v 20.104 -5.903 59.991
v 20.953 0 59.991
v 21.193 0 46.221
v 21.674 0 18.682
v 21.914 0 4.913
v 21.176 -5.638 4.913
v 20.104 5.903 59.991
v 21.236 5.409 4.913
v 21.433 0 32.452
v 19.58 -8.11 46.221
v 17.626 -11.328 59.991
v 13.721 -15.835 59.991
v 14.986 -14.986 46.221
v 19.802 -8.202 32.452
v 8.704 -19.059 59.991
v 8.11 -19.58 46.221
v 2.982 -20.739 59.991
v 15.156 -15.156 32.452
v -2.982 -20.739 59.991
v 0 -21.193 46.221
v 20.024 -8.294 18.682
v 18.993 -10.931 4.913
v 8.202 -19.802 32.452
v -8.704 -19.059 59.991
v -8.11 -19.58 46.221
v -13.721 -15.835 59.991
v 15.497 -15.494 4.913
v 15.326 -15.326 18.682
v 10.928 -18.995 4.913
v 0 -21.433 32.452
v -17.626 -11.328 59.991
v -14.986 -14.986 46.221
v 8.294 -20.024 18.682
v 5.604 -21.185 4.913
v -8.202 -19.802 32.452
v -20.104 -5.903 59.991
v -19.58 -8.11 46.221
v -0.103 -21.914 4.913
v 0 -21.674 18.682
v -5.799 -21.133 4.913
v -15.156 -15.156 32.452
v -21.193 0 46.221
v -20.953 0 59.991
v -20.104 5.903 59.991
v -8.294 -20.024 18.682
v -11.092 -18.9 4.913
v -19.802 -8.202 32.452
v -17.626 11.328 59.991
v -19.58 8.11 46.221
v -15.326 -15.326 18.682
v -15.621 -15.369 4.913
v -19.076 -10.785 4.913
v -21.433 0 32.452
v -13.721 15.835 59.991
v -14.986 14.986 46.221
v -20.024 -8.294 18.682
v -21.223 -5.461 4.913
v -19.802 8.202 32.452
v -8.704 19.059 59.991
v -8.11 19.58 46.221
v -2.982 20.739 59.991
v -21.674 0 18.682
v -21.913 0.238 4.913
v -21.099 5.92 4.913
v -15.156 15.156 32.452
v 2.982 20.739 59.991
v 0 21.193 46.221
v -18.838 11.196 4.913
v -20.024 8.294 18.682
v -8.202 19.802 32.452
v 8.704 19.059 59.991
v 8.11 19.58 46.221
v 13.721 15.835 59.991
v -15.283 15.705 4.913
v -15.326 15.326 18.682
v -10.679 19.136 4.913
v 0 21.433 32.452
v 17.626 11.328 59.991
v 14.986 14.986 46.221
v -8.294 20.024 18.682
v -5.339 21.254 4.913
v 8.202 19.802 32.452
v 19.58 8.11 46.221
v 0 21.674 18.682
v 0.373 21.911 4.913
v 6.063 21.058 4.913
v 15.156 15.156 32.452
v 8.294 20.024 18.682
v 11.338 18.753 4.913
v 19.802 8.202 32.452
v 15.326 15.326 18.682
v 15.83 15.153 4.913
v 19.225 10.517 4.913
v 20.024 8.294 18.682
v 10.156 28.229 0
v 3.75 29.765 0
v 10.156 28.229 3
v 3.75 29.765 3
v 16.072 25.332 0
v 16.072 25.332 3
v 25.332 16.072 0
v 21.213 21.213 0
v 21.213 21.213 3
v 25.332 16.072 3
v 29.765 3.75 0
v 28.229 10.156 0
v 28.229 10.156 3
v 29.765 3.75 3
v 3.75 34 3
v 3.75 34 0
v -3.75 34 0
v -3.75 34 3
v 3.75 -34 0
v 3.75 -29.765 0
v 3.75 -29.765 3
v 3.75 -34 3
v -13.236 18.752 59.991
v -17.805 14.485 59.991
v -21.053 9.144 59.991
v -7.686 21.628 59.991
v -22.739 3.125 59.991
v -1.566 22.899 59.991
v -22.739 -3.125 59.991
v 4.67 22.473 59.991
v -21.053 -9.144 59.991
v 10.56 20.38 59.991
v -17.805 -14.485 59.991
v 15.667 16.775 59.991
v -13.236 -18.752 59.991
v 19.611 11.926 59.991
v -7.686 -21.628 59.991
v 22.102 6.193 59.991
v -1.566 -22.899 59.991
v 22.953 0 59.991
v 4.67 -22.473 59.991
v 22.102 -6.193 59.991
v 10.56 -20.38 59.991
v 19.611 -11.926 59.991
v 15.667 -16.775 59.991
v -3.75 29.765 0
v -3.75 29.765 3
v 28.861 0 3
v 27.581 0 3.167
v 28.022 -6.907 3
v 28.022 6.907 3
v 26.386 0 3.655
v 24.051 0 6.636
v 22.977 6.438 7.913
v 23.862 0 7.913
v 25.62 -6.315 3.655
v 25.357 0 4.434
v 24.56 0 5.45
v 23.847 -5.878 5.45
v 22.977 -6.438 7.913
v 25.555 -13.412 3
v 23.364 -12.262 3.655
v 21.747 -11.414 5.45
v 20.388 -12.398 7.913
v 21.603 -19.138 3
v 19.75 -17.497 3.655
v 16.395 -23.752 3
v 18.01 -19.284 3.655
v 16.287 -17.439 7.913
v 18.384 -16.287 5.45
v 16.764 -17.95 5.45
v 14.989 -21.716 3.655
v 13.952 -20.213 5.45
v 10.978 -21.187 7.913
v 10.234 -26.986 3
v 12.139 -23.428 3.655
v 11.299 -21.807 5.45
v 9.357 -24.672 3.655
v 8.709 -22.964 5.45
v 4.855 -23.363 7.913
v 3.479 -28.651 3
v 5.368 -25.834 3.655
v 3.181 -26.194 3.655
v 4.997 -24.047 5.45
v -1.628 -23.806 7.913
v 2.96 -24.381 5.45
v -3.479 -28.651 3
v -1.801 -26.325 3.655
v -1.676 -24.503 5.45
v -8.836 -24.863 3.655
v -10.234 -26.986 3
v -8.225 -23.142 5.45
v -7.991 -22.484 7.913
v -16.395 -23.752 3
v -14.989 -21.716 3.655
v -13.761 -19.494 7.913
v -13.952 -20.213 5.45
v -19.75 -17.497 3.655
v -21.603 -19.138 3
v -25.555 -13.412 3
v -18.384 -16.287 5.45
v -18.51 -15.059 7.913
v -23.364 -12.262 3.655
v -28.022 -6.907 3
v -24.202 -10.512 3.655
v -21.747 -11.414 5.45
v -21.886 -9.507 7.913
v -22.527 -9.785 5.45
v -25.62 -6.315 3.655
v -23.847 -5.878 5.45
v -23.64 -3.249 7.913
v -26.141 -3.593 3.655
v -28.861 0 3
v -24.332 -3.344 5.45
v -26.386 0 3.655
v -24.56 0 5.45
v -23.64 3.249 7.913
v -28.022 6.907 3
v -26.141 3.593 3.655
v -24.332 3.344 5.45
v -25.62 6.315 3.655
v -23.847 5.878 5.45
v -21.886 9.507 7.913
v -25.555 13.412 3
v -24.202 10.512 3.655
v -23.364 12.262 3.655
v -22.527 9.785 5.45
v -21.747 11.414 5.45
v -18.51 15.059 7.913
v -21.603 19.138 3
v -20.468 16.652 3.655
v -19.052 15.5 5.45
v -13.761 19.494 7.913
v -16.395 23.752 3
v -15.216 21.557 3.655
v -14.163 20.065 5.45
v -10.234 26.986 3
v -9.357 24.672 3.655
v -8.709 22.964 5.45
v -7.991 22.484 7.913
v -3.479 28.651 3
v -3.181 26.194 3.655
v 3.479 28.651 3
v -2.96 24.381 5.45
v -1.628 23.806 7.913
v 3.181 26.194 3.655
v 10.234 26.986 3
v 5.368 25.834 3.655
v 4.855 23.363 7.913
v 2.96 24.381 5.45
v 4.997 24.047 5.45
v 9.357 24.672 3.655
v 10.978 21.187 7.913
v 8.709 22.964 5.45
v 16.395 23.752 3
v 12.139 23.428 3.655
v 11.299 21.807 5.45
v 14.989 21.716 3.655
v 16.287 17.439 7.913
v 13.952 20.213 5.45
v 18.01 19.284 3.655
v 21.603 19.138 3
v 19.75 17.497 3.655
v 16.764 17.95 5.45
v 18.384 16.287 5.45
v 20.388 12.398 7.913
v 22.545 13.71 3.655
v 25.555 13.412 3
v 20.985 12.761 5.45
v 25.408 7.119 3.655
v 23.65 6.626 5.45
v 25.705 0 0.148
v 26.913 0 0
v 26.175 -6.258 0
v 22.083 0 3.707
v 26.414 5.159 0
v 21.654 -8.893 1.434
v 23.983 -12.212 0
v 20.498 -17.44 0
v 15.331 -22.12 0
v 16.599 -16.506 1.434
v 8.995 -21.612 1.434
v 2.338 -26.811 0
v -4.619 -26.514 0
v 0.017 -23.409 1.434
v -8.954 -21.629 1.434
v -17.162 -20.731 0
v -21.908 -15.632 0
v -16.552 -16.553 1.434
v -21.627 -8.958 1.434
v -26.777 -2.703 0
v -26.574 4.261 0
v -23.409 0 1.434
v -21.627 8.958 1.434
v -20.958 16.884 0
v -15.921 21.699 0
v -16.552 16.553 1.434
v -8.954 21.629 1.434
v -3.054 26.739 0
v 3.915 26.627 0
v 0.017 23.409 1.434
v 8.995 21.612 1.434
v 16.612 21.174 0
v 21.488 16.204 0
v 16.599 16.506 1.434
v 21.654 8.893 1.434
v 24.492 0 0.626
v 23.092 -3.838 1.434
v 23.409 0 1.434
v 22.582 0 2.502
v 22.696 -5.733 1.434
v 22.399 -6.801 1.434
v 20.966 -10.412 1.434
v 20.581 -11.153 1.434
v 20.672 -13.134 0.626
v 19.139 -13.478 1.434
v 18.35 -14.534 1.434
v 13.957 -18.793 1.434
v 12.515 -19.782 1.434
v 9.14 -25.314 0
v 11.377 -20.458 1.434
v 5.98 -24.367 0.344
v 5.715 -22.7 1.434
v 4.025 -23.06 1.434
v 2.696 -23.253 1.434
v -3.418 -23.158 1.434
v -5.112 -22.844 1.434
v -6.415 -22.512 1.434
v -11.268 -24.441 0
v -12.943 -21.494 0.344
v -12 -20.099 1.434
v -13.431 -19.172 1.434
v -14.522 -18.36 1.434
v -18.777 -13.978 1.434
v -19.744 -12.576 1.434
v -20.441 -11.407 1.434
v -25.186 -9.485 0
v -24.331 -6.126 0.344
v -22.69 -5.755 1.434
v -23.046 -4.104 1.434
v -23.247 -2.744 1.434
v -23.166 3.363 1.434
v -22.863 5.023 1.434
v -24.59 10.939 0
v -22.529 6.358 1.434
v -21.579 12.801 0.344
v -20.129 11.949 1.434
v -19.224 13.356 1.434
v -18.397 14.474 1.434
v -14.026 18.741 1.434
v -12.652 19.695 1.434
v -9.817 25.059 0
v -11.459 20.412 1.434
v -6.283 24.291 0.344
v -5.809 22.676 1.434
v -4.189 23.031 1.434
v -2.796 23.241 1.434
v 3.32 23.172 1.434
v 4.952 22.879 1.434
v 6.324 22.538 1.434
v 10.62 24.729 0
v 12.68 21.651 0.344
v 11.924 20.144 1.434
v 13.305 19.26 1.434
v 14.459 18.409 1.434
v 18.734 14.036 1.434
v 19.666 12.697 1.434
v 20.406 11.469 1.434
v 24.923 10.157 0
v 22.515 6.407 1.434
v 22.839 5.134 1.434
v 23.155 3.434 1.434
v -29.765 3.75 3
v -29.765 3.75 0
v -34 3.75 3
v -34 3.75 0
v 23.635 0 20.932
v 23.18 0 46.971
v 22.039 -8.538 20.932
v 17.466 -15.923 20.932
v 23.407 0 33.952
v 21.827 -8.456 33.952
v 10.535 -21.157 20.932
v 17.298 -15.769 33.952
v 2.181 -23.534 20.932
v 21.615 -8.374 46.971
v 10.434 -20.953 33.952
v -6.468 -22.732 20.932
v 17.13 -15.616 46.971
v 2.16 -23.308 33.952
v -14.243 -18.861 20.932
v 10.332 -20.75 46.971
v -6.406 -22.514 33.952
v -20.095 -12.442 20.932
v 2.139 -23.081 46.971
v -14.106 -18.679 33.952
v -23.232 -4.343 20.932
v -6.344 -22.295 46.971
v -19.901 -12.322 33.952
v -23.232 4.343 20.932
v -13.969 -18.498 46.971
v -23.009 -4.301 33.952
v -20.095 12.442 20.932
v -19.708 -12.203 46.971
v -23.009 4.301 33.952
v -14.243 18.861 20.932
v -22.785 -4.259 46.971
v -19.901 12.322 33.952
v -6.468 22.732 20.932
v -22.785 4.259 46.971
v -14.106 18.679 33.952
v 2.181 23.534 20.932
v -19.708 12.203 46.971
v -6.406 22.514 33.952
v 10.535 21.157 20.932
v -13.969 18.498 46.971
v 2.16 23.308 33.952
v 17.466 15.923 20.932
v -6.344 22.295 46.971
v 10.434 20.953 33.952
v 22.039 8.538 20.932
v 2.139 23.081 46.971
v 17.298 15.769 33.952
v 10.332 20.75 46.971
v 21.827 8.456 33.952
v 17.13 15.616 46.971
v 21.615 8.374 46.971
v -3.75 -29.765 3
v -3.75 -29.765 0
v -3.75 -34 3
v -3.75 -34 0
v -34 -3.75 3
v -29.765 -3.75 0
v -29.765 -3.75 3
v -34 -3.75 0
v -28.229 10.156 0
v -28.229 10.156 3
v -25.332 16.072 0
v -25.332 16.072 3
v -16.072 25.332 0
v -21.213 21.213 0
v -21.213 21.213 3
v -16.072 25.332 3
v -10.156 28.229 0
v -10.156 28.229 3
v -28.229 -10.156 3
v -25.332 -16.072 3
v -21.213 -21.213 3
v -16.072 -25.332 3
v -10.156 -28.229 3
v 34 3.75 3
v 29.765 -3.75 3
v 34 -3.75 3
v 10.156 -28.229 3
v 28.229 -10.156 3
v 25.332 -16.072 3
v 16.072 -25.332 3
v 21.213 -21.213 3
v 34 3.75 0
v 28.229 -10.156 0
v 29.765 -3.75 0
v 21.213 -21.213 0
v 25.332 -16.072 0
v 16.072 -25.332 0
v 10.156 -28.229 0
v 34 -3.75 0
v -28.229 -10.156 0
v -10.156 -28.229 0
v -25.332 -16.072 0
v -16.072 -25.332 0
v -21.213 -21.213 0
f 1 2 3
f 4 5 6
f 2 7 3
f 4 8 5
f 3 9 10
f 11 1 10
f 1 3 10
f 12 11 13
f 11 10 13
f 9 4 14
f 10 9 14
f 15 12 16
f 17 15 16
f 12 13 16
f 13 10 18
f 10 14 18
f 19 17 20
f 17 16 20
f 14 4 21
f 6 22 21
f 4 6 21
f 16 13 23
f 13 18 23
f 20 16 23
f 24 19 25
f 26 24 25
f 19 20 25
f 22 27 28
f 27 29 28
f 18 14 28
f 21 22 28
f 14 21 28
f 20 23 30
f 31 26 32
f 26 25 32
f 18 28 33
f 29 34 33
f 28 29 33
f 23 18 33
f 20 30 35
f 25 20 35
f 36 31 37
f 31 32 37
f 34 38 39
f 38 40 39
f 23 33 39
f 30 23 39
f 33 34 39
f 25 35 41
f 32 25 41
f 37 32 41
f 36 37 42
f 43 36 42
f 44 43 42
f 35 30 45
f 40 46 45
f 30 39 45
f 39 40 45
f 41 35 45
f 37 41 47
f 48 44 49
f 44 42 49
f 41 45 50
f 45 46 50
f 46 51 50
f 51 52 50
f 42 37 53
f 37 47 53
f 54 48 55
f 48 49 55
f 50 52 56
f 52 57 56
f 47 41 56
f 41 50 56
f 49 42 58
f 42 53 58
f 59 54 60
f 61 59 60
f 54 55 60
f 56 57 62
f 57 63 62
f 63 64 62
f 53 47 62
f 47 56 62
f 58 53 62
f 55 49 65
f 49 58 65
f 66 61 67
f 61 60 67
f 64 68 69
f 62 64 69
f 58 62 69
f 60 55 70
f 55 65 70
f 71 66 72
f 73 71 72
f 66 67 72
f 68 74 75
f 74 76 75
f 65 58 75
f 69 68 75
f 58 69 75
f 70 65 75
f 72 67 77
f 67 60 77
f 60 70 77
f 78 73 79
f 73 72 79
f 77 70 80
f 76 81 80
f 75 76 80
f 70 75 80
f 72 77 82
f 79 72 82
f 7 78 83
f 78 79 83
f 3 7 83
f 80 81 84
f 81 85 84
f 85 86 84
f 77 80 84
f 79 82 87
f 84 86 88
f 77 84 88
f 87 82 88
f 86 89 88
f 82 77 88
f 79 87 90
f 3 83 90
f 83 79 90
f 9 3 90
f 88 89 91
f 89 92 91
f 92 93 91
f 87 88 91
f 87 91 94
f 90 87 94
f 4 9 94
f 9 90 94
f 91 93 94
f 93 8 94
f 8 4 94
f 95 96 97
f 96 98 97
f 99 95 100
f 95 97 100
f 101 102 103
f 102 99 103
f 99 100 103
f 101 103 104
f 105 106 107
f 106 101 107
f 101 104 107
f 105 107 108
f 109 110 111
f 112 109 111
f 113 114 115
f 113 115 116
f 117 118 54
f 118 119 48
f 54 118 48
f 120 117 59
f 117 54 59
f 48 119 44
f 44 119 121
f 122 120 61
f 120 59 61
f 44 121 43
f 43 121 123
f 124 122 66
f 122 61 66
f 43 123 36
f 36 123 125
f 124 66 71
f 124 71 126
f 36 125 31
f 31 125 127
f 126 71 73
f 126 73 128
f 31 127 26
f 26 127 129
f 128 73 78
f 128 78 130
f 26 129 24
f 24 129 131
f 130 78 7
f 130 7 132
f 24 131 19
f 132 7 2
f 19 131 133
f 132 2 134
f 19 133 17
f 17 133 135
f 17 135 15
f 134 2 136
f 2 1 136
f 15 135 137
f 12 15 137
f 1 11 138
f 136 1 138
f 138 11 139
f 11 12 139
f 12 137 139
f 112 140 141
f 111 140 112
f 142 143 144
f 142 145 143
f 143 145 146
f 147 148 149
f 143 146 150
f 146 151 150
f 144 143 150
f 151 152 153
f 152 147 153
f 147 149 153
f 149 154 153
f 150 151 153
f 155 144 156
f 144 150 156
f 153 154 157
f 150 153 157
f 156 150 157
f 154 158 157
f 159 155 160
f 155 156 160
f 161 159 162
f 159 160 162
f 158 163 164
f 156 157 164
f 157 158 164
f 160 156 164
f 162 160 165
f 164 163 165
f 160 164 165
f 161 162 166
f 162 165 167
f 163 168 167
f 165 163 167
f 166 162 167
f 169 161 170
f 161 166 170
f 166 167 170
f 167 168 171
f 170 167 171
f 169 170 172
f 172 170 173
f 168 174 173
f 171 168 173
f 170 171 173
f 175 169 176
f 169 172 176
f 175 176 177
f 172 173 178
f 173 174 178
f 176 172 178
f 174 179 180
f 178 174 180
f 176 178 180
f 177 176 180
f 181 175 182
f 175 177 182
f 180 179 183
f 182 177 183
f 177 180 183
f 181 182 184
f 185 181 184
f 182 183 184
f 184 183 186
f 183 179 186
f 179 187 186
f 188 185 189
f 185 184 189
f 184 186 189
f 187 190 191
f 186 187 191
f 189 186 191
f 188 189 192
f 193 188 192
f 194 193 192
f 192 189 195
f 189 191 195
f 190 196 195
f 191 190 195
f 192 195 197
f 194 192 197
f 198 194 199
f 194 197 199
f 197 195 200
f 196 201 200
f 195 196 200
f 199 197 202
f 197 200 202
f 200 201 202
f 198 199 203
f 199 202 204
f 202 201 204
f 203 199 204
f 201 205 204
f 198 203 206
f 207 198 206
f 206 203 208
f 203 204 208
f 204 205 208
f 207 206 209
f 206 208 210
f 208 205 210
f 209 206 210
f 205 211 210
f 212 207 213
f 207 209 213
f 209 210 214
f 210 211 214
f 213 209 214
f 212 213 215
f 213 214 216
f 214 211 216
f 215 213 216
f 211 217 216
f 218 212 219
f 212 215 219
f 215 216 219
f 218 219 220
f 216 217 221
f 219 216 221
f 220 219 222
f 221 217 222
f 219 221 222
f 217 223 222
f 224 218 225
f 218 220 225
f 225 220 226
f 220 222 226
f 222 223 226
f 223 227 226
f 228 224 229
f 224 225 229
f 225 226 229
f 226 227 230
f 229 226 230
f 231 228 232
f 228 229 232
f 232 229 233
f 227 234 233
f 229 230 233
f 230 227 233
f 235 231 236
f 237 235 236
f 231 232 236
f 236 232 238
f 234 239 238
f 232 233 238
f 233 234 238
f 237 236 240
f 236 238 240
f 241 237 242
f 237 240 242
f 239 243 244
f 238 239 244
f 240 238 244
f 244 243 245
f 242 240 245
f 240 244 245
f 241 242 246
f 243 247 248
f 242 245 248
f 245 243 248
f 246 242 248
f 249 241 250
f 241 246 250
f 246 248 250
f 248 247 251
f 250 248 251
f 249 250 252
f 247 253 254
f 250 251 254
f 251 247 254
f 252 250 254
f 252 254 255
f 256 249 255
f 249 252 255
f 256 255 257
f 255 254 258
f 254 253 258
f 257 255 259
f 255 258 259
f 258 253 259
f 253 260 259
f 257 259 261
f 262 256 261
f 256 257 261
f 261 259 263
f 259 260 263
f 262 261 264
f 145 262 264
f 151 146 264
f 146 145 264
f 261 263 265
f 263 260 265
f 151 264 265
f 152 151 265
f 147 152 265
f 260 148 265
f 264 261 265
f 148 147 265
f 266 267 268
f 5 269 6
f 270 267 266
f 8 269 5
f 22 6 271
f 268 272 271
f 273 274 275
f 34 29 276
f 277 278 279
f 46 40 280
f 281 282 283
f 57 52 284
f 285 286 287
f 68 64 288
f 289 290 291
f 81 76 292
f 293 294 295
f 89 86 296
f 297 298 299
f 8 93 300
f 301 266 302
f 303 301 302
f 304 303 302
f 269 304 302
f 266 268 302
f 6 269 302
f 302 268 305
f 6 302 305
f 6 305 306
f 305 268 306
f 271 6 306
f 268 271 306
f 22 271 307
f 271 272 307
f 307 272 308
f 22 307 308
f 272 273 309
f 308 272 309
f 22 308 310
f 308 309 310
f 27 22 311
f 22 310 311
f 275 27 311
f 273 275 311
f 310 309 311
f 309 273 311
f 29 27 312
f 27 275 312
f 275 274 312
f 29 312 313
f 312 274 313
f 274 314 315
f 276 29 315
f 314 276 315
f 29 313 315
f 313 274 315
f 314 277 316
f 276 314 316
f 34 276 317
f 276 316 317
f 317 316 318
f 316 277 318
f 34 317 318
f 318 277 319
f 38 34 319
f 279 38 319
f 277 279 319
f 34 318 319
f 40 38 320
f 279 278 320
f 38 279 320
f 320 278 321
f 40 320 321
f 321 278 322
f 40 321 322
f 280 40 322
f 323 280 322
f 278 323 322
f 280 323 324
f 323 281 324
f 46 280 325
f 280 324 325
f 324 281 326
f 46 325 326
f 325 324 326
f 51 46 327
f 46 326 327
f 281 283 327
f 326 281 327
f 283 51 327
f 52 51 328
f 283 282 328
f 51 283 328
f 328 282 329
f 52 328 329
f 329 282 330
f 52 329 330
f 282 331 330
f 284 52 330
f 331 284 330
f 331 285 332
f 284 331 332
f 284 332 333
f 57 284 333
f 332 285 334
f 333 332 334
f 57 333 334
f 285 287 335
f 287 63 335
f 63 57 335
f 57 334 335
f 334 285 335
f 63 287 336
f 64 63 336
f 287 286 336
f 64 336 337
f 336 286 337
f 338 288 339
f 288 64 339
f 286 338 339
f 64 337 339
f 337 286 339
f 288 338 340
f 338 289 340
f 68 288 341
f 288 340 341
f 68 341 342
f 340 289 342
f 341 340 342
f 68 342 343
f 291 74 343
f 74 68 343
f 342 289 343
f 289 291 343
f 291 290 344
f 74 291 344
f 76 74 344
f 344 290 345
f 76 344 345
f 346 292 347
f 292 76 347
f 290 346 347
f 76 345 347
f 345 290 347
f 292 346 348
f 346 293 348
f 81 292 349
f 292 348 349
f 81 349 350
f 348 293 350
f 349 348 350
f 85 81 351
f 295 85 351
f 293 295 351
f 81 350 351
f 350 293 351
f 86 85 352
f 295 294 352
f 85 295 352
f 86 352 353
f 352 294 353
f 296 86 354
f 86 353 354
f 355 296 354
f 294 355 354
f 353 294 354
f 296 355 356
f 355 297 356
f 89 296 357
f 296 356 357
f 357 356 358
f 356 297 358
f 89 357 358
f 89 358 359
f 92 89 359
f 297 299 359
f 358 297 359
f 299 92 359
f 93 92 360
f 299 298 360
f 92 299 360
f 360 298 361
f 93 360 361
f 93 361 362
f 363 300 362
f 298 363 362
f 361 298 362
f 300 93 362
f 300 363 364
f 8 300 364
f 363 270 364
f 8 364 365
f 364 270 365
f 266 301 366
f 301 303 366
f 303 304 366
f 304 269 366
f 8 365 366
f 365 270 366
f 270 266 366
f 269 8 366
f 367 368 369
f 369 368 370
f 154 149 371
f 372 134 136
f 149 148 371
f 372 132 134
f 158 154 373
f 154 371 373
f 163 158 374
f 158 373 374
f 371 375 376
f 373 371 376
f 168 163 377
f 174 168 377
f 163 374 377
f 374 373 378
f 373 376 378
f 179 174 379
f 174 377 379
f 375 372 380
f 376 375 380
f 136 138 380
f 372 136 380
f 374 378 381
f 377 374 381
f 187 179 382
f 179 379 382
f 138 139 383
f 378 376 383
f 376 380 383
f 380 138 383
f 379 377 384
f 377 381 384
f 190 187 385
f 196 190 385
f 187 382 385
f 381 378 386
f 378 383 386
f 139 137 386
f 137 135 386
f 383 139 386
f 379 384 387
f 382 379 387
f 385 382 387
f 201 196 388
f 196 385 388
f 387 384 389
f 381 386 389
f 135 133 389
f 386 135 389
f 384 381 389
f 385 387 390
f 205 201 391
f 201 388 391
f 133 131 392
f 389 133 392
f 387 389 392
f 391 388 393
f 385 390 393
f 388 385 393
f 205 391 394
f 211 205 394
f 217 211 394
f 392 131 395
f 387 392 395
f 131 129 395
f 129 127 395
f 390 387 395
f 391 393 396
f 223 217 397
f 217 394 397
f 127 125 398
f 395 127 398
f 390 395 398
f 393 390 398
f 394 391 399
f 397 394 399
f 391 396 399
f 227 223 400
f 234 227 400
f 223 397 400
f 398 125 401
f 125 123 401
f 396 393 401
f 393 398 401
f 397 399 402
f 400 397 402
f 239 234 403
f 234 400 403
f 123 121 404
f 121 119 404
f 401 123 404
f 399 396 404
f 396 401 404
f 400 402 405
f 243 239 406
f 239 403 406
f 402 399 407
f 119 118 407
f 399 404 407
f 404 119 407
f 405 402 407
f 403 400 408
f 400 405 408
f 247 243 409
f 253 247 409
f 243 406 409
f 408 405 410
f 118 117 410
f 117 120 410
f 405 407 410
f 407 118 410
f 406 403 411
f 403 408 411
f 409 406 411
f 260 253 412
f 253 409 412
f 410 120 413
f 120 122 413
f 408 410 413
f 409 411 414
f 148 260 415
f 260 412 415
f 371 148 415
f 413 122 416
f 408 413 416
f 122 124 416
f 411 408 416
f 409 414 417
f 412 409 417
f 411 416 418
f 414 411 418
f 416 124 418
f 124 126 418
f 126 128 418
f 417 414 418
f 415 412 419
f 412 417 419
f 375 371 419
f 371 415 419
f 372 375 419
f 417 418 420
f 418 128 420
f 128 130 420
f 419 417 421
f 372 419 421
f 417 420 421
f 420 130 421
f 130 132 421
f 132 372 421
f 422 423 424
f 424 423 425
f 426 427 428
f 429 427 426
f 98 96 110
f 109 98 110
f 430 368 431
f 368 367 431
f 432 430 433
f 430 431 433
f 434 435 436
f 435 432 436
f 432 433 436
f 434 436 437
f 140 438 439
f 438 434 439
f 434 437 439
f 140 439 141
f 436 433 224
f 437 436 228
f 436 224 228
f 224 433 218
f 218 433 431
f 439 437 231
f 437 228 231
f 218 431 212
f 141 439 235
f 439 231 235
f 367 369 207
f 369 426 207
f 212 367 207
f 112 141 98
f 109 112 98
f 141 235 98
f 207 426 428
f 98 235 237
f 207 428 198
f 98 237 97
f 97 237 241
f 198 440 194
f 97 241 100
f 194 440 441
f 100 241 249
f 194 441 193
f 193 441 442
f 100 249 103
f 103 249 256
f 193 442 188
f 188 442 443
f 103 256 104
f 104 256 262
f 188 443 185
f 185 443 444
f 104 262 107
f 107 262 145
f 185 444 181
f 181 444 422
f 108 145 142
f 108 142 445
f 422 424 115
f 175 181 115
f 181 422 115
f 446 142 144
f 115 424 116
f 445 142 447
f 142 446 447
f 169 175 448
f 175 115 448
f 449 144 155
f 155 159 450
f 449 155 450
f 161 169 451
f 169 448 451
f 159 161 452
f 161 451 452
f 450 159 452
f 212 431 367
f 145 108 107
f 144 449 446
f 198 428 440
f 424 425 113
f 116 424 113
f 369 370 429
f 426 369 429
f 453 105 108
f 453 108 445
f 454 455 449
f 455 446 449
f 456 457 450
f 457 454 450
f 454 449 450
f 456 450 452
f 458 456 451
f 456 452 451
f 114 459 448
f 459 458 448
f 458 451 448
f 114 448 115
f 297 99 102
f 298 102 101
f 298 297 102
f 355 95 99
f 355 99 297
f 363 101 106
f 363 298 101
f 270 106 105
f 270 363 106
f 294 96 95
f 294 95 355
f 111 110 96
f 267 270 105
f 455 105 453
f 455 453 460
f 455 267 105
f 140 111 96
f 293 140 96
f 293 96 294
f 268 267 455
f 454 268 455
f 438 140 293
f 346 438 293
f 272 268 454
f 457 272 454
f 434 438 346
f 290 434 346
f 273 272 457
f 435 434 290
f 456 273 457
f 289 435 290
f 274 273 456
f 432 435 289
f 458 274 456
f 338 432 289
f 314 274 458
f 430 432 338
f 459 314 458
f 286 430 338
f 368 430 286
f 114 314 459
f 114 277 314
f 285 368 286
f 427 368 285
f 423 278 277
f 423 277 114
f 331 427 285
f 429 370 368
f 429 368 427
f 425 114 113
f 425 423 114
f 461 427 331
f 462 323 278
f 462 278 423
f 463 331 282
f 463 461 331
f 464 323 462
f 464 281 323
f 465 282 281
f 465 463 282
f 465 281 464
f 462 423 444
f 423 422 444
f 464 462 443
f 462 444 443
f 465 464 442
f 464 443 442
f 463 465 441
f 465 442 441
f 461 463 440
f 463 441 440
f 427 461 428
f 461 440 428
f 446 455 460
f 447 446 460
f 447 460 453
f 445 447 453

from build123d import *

# Parameters (mm, degrees)
F2_W            = 7.5
F2_H            = 8
F3_DEPTH        = 3
F3_COPIES_COUNT = 4
F4_R            = 5


# Not quite as in the source:
# - a pattern or mirror of a feature is missing from the dataset's text; its kind, count and spacing are read off the source's solid


with BuildPart() as f1:
    # F0 (on Front) → F1 (revolve)
    with BuildSketch(Plane.XZ):
        Polygon((23.9476348052, 3), (24, 0), (30, 0), (30, 3), align=None)
        Polygon((20.9525509577, 59.9908617094), (21.9473301491, 3), (23.9476348052, 3), (22.9528556138, 59.9908617094), align=None)
        Polygon((21.9473301491, 3), (21.9996953439, 0), (24, 0), (23.9476348052, 3), align=None)
    revolve(axis=Axis((0, 0, 53.7638920359), (0, 0, -1)))

    # F2 (on face) → F3 (join)
    with BuildSketch(Plane(origin=(0, 0, 0), x_dir=(1, 0, 0), z_dir=(0, 0, -1))):
        with Locations((0, 30)):
            Rectangle(F2_W, F2_H)
    f3 = extrude(amount=-F3_DEPTH)

    # F3_copies: F3 ×4 about axis
    f3_copies_axis = Axis((0, 0, 0), (0, 0, 1))
    for i in range(1, F3_COPIES_COUNT):
        add(f3.rotate(f3_copies_axis, i * 360 / F3_COPIES_COUNT))

    # F4
    f4_edges = [f1.edges().sort_by_distance(p)[0] for p in [
        (-23.947635, 0, 3),
        (-21.999695, 0, 0),
    ]]
    fillet(f4_edges, radius=F4_R)


solid = f1.part
